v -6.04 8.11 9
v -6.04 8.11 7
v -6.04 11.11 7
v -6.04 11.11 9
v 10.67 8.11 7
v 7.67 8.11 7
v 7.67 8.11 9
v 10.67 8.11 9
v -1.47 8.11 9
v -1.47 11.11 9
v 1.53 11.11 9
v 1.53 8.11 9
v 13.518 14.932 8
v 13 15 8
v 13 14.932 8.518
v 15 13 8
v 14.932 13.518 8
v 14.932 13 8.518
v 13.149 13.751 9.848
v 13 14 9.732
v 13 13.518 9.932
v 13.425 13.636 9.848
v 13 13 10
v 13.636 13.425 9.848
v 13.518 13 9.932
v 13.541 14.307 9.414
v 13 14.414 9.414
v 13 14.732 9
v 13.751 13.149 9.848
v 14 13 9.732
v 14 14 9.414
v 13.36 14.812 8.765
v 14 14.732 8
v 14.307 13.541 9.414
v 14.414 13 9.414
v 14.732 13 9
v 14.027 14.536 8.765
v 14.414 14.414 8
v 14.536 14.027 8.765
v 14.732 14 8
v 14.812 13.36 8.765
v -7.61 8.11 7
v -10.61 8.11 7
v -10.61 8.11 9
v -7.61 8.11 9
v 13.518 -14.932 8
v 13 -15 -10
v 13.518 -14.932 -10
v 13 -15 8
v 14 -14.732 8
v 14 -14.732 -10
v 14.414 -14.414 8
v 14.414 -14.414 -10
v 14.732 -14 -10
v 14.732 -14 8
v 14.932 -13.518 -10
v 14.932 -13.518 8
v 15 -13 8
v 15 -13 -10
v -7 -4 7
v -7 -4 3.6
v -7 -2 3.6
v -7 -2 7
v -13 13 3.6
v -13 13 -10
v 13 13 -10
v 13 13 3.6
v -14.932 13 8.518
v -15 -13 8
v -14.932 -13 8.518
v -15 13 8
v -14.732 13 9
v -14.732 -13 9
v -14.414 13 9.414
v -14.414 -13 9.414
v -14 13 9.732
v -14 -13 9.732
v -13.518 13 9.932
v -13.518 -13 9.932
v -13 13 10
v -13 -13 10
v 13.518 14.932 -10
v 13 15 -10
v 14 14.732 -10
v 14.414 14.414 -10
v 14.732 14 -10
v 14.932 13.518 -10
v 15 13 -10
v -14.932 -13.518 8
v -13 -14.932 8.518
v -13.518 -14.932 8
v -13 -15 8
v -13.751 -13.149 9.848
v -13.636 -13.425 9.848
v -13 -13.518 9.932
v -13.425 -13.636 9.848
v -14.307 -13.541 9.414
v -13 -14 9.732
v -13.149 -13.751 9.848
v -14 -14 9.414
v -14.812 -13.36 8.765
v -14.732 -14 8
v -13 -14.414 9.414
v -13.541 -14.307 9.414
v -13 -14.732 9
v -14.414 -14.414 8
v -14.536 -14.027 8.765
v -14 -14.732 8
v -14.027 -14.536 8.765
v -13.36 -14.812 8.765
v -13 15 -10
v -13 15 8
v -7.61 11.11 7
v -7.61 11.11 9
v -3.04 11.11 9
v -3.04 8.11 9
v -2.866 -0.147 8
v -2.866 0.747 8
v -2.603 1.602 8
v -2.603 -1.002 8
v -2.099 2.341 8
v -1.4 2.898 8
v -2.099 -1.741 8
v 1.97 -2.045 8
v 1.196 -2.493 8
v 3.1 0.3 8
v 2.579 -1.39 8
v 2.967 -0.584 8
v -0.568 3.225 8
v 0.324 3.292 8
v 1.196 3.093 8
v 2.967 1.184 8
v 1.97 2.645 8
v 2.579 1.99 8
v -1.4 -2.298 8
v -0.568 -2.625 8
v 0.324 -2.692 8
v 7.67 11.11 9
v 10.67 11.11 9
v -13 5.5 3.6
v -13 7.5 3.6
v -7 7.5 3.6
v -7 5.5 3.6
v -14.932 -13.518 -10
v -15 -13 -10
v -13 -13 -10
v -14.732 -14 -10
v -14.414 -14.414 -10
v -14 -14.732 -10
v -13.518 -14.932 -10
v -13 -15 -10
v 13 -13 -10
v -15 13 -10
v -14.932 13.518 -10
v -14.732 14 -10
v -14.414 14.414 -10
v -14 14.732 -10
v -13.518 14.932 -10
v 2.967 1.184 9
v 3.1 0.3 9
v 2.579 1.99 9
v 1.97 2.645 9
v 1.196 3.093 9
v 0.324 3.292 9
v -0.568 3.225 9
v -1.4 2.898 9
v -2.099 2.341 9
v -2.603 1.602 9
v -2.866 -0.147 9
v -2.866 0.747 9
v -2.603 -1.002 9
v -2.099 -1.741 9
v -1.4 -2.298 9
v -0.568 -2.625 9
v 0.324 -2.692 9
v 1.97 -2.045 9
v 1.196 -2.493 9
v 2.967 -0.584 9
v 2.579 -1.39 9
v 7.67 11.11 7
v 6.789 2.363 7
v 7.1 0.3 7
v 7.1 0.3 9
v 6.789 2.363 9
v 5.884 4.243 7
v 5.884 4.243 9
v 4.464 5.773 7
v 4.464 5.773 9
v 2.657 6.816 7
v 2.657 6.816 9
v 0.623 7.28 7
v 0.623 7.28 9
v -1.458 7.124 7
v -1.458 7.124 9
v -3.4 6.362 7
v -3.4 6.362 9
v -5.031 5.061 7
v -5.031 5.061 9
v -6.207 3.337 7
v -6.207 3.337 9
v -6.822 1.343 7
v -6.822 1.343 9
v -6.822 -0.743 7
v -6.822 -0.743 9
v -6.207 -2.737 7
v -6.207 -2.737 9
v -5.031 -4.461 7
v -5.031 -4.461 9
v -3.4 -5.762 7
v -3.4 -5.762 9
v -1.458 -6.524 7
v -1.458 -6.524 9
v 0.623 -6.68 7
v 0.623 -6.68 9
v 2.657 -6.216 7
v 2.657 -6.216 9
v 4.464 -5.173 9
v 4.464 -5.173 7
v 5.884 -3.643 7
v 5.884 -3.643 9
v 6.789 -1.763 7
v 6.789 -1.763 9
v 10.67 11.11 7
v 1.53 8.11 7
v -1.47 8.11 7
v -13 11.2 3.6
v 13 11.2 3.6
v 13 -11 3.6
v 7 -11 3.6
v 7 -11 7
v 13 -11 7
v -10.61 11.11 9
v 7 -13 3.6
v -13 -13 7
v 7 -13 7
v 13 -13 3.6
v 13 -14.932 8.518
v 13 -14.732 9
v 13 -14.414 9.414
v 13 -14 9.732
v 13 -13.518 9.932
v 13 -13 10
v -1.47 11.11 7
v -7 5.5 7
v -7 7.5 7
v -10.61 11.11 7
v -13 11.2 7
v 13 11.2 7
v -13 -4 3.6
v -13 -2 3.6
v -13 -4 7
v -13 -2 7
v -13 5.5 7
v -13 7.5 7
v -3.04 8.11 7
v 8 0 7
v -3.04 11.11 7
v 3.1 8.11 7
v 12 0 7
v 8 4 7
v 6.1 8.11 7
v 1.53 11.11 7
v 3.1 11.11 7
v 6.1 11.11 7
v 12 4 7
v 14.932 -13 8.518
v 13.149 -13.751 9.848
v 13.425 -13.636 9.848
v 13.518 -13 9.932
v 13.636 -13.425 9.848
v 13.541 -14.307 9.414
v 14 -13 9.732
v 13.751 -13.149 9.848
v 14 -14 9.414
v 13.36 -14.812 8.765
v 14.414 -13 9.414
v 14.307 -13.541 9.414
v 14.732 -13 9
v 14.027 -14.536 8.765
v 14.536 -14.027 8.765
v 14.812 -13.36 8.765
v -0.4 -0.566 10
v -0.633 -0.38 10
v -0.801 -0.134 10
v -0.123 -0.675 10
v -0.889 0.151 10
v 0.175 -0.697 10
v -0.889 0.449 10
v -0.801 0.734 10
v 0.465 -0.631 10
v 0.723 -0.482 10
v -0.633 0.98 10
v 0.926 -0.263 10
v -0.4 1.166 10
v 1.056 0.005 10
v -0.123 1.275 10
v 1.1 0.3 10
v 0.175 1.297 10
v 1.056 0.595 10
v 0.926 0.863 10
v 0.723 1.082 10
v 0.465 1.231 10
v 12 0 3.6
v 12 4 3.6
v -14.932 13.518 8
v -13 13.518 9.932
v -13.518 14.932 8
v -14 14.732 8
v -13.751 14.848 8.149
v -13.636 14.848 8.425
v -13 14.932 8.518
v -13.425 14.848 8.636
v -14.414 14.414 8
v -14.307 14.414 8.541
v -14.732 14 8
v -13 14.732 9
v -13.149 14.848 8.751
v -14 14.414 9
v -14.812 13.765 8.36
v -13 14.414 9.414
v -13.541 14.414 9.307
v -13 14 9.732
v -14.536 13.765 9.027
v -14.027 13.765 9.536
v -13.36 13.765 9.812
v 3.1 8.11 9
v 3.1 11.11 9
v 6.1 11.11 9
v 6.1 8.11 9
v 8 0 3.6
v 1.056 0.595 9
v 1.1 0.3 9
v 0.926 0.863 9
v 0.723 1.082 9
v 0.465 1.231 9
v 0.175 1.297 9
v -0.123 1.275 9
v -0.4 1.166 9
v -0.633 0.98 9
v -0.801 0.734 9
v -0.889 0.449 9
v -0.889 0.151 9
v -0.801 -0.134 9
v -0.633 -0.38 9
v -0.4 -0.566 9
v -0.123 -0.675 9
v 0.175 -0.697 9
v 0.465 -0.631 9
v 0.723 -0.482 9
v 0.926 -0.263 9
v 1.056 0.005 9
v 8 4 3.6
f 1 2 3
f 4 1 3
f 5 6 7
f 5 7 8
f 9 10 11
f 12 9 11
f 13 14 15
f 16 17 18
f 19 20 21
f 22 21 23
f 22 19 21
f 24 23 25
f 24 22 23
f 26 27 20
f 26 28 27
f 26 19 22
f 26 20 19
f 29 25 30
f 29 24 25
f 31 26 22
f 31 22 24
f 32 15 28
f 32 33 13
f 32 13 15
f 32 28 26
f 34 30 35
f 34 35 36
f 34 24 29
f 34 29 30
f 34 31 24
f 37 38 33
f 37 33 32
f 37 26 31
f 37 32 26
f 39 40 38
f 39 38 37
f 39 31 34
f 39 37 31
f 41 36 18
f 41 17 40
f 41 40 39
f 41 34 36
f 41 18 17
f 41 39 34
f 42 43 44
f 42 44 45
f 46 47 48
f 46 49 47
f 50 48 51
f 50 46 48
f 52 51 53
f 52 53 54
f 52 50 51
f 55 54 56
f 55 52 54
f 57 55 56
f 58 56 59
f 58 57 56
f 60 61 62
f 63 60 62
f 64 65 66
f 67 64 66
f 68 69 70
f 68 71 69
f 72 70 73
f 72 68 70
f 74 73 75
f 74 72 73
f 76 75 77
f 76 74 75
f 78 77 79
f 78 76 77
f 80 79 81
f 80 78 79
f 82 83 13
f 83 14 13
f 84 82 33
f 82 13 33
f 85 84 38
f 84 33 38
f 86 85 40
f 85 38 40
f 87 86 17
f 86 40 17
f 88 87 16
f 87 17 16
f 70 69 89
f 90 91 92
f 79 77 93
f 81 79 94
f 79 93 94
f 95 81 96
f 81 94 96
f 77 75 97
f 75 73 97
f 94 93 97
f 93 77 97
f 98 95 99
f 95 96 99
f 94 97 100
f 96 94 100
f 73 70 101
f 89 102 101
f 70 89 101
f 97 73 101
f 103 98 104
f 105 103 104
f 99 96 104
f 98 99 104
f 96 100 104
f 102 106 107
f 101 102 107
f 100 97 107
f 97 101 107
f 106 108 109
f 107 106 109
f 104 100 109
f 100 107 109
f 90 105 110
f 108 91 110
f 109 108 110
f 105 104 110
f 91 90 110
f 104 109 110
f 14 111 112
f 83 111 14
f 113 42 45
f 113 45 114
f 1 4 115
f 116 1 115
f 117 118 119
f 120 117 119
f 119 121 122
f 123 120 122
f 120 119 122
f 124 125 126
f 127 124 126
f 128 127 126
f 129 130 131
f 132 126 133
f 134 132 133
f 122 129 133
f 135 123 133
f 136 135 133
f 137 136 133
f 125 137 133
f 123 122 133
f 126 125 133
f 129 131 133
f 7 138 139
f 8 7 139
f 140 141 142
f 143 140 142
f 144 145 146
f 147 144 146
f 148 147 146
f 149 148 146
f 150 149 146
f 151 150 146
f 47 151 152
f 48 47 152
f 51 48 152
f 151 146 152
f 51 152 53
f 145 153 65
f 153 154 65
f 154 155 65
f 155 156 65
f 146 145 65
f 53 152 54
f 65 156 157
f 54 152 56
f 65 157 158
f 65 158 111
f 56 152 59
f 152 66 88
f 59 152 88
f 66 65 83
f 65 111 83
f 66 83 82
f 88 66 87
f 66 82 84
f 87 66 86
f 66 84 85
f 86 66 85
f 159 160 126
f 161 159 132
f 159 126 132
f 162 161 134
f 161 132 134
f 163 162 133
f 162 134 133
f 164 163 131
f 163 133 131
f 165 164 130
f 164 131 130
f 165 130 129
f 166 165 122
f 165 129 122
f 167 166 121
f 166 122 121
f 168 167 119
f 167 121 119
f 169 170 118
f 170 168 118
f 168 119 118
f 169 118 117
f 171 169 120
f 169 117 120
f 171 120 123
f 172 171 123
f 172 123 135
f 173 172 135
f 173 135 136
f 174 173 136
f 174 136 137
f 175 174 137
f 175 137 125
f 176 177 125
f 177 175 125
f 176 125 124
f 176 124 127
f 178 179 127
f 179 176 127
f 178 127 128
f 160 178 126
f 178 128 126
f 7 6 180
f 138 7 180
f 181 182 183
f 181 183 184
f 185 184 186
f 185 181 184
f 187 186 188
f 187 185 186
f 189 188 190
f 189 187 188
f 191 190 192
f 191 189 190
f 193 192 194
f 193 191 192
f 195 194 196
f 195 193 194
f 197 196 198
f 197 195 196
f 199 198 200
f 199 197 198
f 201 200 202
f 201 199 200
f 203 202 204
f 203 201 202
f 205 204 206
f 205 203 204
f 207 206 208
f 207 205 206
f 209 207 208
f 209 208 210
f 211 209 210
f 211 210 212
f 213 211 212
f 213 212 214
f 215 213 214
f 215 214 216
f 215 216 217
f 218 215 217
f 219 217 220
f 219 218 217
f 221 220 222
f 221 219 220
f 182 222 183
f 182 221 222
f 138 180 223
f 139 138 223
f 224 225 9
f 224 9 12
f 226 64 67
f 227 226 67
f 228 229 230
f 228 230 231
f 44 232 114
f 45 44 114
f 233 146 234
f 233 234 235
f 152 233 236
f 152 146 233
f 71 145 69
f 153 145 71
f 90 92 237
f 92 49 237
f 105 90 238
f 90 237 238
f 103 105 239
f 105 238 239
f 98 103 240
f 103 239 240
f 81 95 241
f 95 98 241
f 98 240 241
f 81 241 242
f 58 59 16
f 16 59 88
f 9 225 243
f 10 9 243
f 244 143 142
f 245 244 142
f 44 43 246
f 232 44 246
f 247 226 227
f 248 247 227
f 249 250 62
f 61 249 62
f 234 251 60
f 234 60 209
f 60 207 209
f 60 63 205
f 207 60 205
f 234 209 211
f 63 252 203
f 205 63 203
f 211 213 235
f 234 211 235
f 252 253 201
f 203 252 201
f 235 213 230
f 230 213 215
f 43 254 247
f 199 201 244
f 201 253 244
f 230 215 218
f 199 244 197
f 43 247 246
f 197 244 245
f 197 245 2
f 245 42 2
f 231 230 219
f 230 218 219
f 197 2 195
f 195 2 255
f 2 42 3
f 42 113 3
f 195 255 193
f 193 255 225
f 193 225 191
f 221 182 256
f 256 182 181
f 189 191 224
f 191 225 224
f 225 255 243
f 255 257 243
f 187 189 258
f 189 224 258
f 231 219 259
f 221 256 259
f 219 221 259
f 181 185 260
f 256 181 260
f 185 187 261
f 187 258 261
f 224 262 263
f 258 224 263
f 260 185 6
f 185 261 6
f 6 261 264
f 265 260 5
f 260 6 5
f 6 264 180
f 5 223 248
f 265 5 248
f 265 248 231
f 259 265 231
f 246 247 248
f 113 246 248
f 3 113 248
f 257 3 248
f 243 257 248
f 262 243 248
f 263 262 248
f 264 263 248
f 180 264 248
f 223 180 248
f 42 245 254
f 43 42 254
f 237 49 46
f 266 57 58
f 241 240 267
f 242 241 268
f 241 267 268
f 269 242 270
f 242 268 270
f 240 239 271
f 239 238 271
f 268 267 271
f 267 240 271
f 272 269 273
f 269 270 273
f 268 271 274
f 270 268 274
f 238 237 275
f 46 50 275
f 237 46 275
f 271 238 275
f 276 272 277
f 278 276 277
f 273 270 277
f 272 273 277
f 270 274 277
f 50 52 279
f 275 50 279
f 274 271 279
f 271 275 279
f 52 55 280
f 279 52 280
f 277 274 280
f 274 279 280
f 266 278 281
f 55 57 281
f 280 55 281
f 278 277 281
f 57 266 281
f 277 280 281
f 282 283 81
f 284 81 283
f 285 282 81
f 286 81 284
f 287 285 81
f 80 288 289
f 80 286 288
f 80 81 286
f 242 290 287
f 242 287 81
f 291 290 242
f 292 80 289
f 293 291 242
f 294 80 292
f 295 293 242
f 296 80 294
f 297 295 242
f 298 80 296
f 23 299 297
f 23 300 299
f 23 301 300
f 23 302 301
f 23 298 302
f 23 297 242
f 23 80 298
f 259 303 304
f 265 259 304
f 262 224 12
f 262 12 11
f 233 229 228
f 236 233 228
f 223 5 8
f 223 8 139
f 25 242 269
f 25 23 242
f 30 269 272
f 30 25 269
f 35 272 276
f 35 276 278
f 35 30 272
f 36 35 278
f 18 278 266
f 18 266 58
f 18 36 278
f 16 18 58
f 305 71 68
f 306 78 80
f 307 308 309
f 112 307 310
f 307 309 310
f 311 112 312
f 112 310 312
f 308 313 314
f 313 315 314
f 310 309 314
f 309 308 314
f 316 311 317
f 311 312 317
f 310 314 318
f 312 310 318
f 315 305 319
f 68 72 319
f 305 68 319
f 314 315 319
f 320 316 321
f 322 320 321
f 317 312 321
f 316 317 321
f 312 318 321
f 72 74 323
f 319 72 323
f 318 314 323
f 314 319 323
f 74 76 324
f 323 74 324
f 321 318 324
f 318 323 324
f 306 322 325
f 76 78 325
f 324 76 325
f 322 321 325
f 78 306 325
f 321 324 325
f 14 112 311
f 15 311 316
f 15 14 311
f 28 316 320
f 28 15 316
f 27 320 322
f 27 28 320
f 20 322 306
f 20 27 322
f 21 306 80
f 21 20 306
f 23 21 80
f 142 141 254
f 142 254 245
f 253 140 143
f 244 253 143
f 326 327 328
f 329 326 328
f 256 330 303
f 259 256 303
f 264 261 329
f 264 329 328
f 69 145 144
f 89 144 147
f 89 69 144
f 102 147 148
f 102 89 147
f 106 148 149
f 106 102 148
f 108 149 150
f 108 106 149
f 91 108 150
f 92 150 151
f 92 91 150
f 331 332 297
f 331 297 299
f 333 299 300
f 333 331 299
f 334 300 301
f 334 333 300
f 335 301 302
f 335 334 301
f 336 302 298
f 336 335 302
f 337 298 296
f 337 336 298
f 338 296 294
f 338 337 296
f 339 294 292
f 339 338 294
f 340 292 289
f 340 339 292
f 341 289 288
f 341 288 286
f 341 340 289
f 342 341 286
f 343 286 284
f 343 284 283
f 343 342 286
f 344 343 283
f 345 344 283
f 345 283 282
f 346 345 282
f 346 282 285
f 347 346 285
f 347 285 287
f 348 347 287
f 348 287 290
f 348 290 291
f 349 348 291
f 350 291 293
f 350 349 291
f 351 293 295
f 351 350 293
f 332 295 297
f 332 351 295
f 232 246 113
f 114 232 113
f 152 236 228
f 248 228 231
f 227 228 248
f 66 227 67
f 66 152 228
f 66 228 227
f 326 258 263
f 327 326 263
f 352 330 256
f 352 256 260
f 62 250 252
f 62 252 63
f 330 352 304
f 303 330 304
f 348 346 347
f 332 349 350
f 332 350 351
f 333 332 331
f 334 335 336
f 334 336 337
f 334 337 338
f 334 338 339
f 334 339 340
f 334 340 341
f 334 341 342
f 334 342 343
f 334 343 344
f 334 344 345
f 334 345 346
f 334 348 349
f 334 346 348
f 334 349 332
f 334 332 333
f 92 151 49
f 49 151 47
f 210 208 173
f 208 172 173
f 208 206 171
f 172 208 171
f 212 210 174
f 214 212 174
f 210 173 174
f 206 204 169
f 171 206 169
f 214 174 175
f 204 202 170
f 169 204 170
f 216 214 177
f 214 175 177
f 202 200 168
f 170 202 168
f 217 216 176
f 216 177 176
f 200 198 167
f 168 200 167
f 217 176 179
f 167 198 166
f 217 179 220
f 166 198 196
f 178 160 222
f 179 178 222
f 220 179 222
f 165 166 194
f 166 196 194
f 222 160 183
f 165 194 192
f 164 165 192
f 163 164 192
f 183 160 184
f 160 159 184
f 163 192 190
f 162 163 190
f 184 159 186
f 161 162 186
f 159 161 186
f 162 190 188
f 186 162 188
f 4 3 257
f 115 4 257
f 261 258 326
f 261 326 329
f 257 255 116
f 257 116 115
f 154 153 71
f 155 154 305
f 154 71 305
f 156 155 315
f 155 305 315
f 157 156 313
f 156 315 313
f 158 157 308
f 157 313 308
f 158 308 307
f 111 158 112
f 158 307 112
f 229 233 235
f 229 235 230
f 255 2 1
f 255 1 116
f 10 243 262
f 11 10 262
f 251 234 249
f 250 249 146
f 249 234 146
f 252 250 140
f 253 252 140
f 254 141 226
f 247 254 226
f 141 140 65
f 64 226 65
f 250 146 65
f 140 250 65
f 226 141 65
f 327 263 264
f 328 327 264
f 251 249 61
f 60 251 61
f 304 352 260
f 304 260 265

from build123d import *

# Parameters (mm, degrees)
CYLINDER002_R     = 1
CYLINDER002_DEPTH = 1
BOX006_W          = 3
BOX006_H          = 3
BOX006_DEPTH      = 2
BOX005_W          = 3
BOX005_H          = 3
BOX005_DEPTH      = 2
BOX003_W          = 3
BOX003_H          = 3
BOX003_DEPTH      = 2
BOX004_W          = 3
BOX004_H          = 3
BOX004_DEPTH      = 2
BOX002_W          = 3
BOX002_H          = 3
BOX002_DEPTH      = 2
CYLINDER_R        = 7
CYLINDER_DEPTH    = 2
BOX_W             = 26
BOX_H             = 26
BOX_DEPTH         = 17
BOX001_W          = 30
BOX001_H          = 30
BOX001_DEPTH      = 20
CYLINDER001_R     = 3
CYLINDER001_DEPTH = 2
BOX010_W          = 6
BOX010_H          = 2
BOX010_DEPTH      = 3.4
BOX008_W          = 4
BOX008_H          = 4
BOX008_DEPTH      = 3.4
BOX007_W          = 26
BOX007_H          = 1.8
BOX007_DEPTH      = 3.4
BOX009_W          = 6
BOX009_H          = 2
BOX009_DEPTH      = 3.4
BOX011_W          = 6
BOX011_H          = 2
BOX011_DEPTH      = 3.4
FILLET_R          = 2


with BuildPart() as buttouch001:
    # Cylinder002 → Cylinder002 (new body)
    with BuildSketch(Plane(origin=(0.1, 0.3, 9), x_dir=(1, 0, 0), z_dir=(0, 0, 1))):
        Circle(CYLINDER002_R)
    extrude(amount=CYLINDER002_DEPTH)


with BuildPart() as l5:
    # Box006 → Box006 (new body)
    with BuildSketch(Plane(origin=(7.67, 8.11, 7), x_dir=(1, 0, 0), z_dir=(0, 0, 1))):
        with Locations((1.5, 1.5)):
            Rectangle(BOX006_W, BOX006_H)
    extrude(amount=BOX006_DEPTH)


with BuildPart() as l4:
    # Box005 → Box005 (new body)
    with BuildSketch(Plane(origin=(3.1, 8.11, 7), x_dir=(1, 0, 0), z_dir=(0, 0, 1))):
        with Locations((1.5, 1.5)):
            Rectangle(BOX005_W, BOX005_H)
    extrude(amount=BOX005_DEPTH)


with BuildPart() as l2:
    # Box003 → Box003 (new body)
    with BuildSketch(Plane(origin=(-6.04, 8.11, 7), x_dir=(1, 0, 0), z_dir=(0, 0, 1))):
        with Locations((1.5, 1.5)):
            Rectangle(BOX003_W, BOX003_H)
    extrude(amount=BOX003_DEPTH)


with BuildPart() as l3:
    # Box004 → Box004 (new body)
    with BuildSketch(Plane(origin=(-1.47, 8.11, 7), x_dir=(1, 0, 0), z_dir=(0, 0, 1))):
        with Locations((1.5, 1.5)):
            Rectangle(BOX004_W, BOX004_H)
    extrude(amount=BOX004_DEPTH)


with BuildPart() as fusion:
    # Box002 → Box002 (new body)
    with BuildSketch(Plane(origin=(-10.61, 8.11, 7), x_dir=(1, 0, 0), z_dir=(0, 0, 1))):
        with Locations((1.5, 1.5)):
            Rectangle(BOX002_W, BOX002_H)
    extrude(amount=BOX002_DEPTH)

    # Fusion: union L5, L4, L2, L3
    add(l5.part)
    add(l4.part)
    add(l2.part)
    add(l3.part)


with BuildPart() as but:
    # Cylinder → Cylinder (new body)
    with BuildSketch(Plane(origin=(0.1, 0.3, 7), x_dir=(1, 0, 0), z_dir=(0, 0, 1))):
        Circle(CYLINDER_R)
    extrude(amount=CYLINDER_DEPTH)


with BuildPart() as maininside:
    # Box → Box (new body)
    with BuildSketch(Plane(origin=(-13, -13, -10), x_dir=(1, 0, 0), z_dir=(0, 0, 1))):
        with Locations((13, 13)):
            Rectangle(BOX_W, BOX_H)
    extrude(amount=BOX_DEPTH)


with BuildPart() as cut002:
    # Box001 → Box001 (new body)
    with BuildSketch(Plane(origin=(-15, -15, -10), x_dir=(1, 0, 0), z_dir=(0, 0, 1))):
        with Locations((15, 15)):
            Rectangle(BOX001_W, BOX001_H)
    extrude(amount=BOX001_DEPTH)

    # Cut: cut MainInside
    add(maininside.part, mode=Mode.SUBTRACT)

    # Cut001: cut But
    add(but.part, mode=Mode.SUBTRACT)

    # Cut002: cut Fusion
    add(fusion.part, mode=Mode.SUBTRACT)


with BuildPart() as cut003:
    # Cylinder001 → Cylinder001 (new body)
    with BuildSketch(Plane(origin=(0.1, 0.3, 8), x_dir=(1, 0, 0), z_dir=(0, 0, 1))):
        Circle(CYLINDER001_R)
    extrude(amount=CYLINDER001_DEPTH)

    # Fusion001: union Cut002
    add(cut002.part)

    # Cut003: cut ButTouch001
    add(buttouch001.part, mode=Mode.SUBTRACT)


with BuildPart() as cubedestek4:
    # Box010 → Box010 (new body)
    with BuildSketch(Plane(origin=(-13, 5.5, 3.6), x_dir=(1, 0, 0), z_dir=(0, 0, 1))):
        with Locations((3, 1)):
            Rectangle(BOX010_W, BOX010_H)
    extrude(amount=BOX010_DEPTH)


with BuildPart() as cubedestek2:
    # Box008 → Box008 (new body)
    with BuildSketch(Plane(origin=(8, 0, 3.6), x_dir=(1, 0, 0), z_dir=(0, 0, 1))):
        with Locations((2, 2)):
            Rectangle(BOX008_W, BOX008_H)
    extrude(amount=BOX008_DEPTH)


with BuildPart() as cubedestek:
    # Box007 → Box007 (new body)
    with BuildSketch(Plane(origin=(-13, 11.2, 3.6), x_dir=(1, 0, 0), z_dir=(0, 0, 1))):
        with Locations((13, 0.9)):
            Rectangle(BOX007_W, BOX007_H)
    extrude(amount=BOX007_DEPTH)


with BuildPart() as cubedestek3:
    # Box009 → Box009 (new body)
    with BuildSketch(Plane(origin=(-13, -4, 3.6), x_dir=(1, 0, 0), z_dir=(0, 0, 1))):
        with Locations((3, 1)):
            Rectangle(BOX009_W, BOX009_H)
    extrude(amount=BOX009_DEPTH)


with BuildPart() as fillet_body:
    # Box011 → Box011 (new body)
    with BuildSketch(Plane(origin=(7, -13, 3.6), x_dir=(1, 0, 0), z_dir=(0, 0, 1))):
        with Locations((3, 1)):
            Rectangle(BOX011_W, BOX011_H)
    extrude(amount=BOX011_DEPTH)

    # Fusion002: union CubeDestek4, CubeDestek2, CubeDestek, CubeDestek3
    add(cubedestek4.part)
    add(cubedestek2.part)
    add(cubedestek.part)
    add(cubedestek3.part)

    # Fusion003: union Cut003
    add(cut003.part)

    # Fillet
    fillet_edges = [fillet_body.edges().sort_by_distance(p)[0] for p in [
        (-15, -15, 0),
        (-15, 0, 10),
        (-15, 15, 0),
        (15, 15, 0),
        (0, 15, 10),
        (15, -15, 0),
        (0, -15, 10),
        (15, 0, 10),
    ]]
    fillet(fillet_edges, radius=FILLET_R)


solid = fillet_body.part
